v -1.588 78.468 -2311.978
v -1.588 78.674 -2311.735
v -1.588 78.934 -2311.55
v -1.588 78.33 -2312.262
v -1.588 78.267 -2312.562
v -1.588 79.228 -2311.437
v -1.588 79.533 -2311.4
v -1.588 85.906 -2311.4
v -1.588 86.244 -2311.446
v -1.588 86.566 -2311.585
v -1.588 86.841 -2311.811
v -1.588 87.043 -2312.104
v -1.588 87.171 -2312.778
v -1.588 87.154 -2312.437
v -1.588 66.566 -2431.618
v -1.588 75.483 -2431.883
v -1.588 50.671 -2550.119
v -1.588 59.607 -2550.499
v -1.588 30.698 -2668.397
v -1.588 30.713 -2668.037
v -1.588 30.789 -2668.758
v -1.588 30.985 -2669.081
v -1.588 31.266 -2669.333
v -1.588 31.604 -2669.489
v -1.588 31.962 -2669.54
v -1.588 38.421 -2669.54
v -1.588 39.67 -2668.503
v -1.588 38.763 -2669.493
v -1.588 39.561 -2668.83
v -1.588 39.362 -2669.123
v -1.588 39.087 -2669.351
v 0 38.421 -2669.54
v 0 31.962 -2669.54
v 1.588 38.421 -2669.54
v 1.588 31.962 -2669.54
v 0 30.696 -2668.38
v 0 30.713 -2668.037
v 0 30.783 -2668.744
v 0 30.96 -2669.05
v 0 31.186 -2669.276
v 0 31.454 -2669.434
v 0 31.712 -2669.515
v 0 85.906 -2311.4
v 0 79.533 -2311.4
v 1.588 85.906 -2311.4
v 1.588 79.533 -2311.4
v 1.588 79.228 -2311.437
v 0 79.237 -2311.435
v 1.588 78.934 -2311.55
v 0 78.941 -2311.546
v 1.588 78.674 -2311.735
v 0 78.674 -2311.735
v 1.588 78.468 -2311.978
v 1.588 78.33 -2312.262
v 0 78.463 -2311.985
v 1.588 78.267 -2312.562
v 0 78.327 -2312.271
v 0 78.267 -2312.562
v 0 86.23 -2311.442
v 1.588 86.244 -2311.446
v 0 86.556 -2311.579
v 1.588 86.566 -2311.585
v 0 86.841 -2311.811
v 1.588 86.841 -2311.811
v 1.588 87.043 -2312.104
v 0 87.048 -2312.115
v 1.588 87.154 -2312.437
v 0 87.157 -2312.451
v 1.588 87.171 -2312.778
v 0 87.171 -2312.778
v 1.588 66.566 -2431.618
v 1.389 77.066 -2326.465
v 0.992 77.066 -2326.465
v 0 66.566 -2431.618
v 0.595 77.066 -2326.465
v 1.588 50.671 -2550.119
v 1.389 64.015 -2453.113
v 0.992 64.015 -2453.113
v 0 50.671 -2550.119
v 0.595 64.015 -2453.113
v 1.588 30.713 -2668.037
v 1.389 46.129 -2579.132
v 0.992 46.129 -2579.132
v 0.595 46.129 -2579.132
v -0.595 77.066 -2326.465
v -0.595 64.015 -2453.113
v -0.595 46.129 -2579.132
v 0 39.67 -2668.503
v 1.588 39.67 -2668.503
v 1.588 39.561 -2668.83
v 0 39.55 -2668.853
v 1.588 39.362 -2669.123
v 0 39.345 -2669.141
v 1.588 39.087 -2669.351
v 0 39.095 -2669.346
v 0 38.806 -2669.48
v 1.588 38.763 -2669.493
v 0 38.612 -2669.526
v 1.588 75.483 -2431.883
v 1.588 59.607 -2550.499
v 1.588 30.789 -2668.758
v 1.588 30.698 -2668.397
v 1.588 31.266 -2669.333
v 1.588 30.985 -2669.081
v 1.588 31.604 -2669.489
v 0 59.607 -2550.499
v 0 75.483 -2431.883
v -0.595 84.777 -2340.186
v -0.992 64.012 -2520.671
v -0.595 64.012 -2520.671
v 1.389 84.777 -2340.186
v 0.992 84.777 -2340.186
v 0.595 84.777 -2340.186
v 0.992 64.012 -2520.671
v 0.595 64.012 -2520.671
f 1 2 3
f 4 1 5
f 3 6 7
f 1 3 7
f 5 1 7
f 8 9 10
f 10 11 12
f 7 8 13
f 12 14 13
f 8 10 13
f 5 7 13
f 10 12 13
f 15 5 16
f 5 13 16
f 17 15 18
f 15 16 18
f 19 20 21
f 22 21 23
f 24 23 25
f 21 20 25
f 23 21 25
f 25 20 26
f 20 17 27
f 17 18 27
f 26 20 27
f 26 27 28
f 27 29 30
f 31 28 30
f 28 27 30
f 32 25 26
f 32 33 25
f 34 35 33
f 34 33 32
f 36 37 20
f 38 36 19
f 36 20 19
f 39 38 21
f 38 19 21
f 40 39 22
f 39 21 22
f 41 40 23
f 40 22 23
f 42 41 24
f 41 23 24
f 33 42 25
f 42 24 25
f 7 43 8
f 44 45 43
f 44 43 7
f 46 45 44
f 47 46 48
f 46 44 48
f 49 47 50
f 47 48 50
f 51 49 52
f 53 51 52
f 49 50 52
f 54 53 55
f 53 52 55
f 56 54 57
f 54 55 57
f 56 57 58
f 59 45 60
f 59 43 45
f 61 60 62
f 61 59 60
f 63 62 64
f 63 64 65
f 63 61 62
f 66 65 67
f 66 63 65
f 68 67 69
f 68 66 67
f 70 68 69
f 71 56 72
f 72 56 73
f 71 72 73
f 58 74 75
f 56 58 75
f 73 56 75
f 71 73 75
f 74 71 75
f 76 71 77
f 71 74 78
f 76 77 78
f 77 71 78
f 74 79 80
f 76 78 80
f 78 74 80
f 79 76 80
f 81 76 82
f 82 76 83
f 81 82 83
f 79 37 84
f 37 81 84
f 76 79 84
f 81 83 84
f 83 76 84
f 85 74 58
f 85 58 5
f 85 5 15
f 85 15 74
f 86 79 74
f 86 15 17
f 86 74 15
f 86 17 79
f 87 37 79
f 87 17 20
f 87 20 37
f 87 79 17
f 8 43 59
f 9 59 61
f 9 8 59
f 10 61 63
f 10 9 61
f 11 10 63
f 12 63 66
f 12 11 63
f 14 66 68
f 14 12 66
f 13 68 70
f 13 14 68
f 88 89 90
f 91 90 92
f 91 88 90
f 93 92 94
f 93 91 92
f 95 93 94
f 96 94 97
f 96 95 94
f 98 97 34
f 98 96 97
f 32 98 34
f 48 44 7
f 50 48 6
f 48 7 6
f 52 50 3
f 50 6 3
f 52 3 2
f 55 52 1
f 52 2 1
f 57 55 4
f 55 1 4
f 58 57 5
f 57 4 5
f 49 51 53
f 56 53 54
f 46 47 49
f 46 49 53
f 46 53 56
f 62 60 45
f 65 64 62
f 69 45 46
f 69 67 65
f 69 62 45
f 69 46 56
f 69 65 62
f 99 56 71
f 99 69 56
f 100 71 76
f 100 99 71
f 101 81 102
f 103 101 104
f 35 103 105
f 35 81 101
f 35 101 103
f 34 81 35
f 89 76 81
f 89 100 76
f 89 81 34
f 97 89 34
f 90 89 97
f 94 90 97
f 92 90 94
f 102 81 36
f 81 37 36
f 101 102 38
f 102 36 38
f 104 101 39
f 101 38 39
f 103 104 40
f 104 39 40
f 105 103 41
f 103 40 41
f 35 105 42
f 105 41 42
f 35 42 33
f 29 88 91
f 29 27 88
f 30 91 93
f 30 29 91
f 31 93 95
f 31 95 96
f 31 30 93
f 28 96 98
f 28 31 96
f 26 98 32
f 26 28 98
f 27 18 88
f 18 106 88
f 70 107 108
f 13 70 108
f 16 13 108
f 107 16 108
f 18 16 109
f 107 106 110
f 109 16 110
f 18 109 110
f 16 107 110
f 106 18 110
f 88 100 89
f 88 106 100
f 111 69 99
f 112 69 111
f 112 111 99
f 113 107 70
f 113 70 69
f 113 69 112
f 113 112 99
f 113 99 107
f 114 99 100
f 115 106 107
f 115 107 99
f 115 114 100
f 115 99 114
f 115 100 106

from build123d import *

# Parameters (mm, degrees)
BOSS_EXTRUDE1_DEPTH = 1.5875
FILLET1_R           = 1.27


with BuildPart() as part:
    # Sketch2 → Boss-Extrude1 (new body, symmetric)
    with BuildSketch(Plane(origin=(0, 0, 0), x_dir=(0, 0, -1), z_dir=(1, 0, 0))):
        with BuildLine():
            Line((2311.4, 87.288523189), (2311.4, 78.366424638))
            add(Edge.make_bspline(
                [(2311.4, 78.366424638), (2316.422531269, 77.938965796), (2326.465798303, 77.072769892), (2355.87015988, 74.461943474), (2400.271952644, 70.201698936), (2479.570468264, 61.127378254), (2559.292087872, 49.650907614), (2626.797554585, 38.235484735), (2656.889518578, 32.788503969), (2667.159793662, 30.877771266), (2669.54, 30.432069924)],
                knots=[0.595962005, 0.595962005, 0.595962005, 0.595962005, 0.611587005, 0.627212005, 0.6875, 0.75, 0.875, 0.9375, 0.96241067, 0.969928536, 0.969928536, 0.969928536, 0.969928536], degree=3))
            Line((2669.54, 30.432069924), (2669.54, 39.476142465))
            add(Edge.make_bspline(
                [(2311.4, 87.288523189), (2320.997112773, 86.472755043), (2330.592544535, 85.637637379), (2350.239356518, 83.874334847), (2360.290489794, 82.943307484), (2380.385973971, 81.003183297), (2390.430065378, 79.993418555), (2420.547026195, 76.827577532), (2440.60648589, 74.533672955), (2480.675569568, 69.556278523), (2500.68715183, 66.874150811), (2540.654290207, 61.150246295), (2560.611026428, 58.109755646), (2600.475457131, 51.702465574), (2620.382967089, 48.337538888), (2650.028116889, 43.072156367), (2659.78844051, 41.29687683), (2669.54, 39.476142465)],
                knots=[0.595181211, 0.595181211, 0.595181211, 0.595181211, 0.625, 0.625, 0.65625, 0.65625, 0.6875, 0.6875, 0.75, 0.75, 0.8125, 0.8125, 0.875, 0.875, 0.9375, 0.9375, 0.968210768, 0.968210768, 0.968210768, 0.968210768], degree=3))
        make_face()
    extrude(amount=BOSS_EXTRUDE1_DEPTH, both=True)

    # Fillet1
    fillet1_edges = [part.edges().sort_by_distance(p)[0] for p in [
        (-0.79375, 78.366424638, -2311.4),
        (-0.79375, 87.288523189, -2311.4),
        (-0.79375, 30.432069924, -2669.54),
        (-0.79375, 39.476142465, -2669.54),
    ]]
    fillet(fillet1_edges, radius=FILLET1_R)


solid = part.part
